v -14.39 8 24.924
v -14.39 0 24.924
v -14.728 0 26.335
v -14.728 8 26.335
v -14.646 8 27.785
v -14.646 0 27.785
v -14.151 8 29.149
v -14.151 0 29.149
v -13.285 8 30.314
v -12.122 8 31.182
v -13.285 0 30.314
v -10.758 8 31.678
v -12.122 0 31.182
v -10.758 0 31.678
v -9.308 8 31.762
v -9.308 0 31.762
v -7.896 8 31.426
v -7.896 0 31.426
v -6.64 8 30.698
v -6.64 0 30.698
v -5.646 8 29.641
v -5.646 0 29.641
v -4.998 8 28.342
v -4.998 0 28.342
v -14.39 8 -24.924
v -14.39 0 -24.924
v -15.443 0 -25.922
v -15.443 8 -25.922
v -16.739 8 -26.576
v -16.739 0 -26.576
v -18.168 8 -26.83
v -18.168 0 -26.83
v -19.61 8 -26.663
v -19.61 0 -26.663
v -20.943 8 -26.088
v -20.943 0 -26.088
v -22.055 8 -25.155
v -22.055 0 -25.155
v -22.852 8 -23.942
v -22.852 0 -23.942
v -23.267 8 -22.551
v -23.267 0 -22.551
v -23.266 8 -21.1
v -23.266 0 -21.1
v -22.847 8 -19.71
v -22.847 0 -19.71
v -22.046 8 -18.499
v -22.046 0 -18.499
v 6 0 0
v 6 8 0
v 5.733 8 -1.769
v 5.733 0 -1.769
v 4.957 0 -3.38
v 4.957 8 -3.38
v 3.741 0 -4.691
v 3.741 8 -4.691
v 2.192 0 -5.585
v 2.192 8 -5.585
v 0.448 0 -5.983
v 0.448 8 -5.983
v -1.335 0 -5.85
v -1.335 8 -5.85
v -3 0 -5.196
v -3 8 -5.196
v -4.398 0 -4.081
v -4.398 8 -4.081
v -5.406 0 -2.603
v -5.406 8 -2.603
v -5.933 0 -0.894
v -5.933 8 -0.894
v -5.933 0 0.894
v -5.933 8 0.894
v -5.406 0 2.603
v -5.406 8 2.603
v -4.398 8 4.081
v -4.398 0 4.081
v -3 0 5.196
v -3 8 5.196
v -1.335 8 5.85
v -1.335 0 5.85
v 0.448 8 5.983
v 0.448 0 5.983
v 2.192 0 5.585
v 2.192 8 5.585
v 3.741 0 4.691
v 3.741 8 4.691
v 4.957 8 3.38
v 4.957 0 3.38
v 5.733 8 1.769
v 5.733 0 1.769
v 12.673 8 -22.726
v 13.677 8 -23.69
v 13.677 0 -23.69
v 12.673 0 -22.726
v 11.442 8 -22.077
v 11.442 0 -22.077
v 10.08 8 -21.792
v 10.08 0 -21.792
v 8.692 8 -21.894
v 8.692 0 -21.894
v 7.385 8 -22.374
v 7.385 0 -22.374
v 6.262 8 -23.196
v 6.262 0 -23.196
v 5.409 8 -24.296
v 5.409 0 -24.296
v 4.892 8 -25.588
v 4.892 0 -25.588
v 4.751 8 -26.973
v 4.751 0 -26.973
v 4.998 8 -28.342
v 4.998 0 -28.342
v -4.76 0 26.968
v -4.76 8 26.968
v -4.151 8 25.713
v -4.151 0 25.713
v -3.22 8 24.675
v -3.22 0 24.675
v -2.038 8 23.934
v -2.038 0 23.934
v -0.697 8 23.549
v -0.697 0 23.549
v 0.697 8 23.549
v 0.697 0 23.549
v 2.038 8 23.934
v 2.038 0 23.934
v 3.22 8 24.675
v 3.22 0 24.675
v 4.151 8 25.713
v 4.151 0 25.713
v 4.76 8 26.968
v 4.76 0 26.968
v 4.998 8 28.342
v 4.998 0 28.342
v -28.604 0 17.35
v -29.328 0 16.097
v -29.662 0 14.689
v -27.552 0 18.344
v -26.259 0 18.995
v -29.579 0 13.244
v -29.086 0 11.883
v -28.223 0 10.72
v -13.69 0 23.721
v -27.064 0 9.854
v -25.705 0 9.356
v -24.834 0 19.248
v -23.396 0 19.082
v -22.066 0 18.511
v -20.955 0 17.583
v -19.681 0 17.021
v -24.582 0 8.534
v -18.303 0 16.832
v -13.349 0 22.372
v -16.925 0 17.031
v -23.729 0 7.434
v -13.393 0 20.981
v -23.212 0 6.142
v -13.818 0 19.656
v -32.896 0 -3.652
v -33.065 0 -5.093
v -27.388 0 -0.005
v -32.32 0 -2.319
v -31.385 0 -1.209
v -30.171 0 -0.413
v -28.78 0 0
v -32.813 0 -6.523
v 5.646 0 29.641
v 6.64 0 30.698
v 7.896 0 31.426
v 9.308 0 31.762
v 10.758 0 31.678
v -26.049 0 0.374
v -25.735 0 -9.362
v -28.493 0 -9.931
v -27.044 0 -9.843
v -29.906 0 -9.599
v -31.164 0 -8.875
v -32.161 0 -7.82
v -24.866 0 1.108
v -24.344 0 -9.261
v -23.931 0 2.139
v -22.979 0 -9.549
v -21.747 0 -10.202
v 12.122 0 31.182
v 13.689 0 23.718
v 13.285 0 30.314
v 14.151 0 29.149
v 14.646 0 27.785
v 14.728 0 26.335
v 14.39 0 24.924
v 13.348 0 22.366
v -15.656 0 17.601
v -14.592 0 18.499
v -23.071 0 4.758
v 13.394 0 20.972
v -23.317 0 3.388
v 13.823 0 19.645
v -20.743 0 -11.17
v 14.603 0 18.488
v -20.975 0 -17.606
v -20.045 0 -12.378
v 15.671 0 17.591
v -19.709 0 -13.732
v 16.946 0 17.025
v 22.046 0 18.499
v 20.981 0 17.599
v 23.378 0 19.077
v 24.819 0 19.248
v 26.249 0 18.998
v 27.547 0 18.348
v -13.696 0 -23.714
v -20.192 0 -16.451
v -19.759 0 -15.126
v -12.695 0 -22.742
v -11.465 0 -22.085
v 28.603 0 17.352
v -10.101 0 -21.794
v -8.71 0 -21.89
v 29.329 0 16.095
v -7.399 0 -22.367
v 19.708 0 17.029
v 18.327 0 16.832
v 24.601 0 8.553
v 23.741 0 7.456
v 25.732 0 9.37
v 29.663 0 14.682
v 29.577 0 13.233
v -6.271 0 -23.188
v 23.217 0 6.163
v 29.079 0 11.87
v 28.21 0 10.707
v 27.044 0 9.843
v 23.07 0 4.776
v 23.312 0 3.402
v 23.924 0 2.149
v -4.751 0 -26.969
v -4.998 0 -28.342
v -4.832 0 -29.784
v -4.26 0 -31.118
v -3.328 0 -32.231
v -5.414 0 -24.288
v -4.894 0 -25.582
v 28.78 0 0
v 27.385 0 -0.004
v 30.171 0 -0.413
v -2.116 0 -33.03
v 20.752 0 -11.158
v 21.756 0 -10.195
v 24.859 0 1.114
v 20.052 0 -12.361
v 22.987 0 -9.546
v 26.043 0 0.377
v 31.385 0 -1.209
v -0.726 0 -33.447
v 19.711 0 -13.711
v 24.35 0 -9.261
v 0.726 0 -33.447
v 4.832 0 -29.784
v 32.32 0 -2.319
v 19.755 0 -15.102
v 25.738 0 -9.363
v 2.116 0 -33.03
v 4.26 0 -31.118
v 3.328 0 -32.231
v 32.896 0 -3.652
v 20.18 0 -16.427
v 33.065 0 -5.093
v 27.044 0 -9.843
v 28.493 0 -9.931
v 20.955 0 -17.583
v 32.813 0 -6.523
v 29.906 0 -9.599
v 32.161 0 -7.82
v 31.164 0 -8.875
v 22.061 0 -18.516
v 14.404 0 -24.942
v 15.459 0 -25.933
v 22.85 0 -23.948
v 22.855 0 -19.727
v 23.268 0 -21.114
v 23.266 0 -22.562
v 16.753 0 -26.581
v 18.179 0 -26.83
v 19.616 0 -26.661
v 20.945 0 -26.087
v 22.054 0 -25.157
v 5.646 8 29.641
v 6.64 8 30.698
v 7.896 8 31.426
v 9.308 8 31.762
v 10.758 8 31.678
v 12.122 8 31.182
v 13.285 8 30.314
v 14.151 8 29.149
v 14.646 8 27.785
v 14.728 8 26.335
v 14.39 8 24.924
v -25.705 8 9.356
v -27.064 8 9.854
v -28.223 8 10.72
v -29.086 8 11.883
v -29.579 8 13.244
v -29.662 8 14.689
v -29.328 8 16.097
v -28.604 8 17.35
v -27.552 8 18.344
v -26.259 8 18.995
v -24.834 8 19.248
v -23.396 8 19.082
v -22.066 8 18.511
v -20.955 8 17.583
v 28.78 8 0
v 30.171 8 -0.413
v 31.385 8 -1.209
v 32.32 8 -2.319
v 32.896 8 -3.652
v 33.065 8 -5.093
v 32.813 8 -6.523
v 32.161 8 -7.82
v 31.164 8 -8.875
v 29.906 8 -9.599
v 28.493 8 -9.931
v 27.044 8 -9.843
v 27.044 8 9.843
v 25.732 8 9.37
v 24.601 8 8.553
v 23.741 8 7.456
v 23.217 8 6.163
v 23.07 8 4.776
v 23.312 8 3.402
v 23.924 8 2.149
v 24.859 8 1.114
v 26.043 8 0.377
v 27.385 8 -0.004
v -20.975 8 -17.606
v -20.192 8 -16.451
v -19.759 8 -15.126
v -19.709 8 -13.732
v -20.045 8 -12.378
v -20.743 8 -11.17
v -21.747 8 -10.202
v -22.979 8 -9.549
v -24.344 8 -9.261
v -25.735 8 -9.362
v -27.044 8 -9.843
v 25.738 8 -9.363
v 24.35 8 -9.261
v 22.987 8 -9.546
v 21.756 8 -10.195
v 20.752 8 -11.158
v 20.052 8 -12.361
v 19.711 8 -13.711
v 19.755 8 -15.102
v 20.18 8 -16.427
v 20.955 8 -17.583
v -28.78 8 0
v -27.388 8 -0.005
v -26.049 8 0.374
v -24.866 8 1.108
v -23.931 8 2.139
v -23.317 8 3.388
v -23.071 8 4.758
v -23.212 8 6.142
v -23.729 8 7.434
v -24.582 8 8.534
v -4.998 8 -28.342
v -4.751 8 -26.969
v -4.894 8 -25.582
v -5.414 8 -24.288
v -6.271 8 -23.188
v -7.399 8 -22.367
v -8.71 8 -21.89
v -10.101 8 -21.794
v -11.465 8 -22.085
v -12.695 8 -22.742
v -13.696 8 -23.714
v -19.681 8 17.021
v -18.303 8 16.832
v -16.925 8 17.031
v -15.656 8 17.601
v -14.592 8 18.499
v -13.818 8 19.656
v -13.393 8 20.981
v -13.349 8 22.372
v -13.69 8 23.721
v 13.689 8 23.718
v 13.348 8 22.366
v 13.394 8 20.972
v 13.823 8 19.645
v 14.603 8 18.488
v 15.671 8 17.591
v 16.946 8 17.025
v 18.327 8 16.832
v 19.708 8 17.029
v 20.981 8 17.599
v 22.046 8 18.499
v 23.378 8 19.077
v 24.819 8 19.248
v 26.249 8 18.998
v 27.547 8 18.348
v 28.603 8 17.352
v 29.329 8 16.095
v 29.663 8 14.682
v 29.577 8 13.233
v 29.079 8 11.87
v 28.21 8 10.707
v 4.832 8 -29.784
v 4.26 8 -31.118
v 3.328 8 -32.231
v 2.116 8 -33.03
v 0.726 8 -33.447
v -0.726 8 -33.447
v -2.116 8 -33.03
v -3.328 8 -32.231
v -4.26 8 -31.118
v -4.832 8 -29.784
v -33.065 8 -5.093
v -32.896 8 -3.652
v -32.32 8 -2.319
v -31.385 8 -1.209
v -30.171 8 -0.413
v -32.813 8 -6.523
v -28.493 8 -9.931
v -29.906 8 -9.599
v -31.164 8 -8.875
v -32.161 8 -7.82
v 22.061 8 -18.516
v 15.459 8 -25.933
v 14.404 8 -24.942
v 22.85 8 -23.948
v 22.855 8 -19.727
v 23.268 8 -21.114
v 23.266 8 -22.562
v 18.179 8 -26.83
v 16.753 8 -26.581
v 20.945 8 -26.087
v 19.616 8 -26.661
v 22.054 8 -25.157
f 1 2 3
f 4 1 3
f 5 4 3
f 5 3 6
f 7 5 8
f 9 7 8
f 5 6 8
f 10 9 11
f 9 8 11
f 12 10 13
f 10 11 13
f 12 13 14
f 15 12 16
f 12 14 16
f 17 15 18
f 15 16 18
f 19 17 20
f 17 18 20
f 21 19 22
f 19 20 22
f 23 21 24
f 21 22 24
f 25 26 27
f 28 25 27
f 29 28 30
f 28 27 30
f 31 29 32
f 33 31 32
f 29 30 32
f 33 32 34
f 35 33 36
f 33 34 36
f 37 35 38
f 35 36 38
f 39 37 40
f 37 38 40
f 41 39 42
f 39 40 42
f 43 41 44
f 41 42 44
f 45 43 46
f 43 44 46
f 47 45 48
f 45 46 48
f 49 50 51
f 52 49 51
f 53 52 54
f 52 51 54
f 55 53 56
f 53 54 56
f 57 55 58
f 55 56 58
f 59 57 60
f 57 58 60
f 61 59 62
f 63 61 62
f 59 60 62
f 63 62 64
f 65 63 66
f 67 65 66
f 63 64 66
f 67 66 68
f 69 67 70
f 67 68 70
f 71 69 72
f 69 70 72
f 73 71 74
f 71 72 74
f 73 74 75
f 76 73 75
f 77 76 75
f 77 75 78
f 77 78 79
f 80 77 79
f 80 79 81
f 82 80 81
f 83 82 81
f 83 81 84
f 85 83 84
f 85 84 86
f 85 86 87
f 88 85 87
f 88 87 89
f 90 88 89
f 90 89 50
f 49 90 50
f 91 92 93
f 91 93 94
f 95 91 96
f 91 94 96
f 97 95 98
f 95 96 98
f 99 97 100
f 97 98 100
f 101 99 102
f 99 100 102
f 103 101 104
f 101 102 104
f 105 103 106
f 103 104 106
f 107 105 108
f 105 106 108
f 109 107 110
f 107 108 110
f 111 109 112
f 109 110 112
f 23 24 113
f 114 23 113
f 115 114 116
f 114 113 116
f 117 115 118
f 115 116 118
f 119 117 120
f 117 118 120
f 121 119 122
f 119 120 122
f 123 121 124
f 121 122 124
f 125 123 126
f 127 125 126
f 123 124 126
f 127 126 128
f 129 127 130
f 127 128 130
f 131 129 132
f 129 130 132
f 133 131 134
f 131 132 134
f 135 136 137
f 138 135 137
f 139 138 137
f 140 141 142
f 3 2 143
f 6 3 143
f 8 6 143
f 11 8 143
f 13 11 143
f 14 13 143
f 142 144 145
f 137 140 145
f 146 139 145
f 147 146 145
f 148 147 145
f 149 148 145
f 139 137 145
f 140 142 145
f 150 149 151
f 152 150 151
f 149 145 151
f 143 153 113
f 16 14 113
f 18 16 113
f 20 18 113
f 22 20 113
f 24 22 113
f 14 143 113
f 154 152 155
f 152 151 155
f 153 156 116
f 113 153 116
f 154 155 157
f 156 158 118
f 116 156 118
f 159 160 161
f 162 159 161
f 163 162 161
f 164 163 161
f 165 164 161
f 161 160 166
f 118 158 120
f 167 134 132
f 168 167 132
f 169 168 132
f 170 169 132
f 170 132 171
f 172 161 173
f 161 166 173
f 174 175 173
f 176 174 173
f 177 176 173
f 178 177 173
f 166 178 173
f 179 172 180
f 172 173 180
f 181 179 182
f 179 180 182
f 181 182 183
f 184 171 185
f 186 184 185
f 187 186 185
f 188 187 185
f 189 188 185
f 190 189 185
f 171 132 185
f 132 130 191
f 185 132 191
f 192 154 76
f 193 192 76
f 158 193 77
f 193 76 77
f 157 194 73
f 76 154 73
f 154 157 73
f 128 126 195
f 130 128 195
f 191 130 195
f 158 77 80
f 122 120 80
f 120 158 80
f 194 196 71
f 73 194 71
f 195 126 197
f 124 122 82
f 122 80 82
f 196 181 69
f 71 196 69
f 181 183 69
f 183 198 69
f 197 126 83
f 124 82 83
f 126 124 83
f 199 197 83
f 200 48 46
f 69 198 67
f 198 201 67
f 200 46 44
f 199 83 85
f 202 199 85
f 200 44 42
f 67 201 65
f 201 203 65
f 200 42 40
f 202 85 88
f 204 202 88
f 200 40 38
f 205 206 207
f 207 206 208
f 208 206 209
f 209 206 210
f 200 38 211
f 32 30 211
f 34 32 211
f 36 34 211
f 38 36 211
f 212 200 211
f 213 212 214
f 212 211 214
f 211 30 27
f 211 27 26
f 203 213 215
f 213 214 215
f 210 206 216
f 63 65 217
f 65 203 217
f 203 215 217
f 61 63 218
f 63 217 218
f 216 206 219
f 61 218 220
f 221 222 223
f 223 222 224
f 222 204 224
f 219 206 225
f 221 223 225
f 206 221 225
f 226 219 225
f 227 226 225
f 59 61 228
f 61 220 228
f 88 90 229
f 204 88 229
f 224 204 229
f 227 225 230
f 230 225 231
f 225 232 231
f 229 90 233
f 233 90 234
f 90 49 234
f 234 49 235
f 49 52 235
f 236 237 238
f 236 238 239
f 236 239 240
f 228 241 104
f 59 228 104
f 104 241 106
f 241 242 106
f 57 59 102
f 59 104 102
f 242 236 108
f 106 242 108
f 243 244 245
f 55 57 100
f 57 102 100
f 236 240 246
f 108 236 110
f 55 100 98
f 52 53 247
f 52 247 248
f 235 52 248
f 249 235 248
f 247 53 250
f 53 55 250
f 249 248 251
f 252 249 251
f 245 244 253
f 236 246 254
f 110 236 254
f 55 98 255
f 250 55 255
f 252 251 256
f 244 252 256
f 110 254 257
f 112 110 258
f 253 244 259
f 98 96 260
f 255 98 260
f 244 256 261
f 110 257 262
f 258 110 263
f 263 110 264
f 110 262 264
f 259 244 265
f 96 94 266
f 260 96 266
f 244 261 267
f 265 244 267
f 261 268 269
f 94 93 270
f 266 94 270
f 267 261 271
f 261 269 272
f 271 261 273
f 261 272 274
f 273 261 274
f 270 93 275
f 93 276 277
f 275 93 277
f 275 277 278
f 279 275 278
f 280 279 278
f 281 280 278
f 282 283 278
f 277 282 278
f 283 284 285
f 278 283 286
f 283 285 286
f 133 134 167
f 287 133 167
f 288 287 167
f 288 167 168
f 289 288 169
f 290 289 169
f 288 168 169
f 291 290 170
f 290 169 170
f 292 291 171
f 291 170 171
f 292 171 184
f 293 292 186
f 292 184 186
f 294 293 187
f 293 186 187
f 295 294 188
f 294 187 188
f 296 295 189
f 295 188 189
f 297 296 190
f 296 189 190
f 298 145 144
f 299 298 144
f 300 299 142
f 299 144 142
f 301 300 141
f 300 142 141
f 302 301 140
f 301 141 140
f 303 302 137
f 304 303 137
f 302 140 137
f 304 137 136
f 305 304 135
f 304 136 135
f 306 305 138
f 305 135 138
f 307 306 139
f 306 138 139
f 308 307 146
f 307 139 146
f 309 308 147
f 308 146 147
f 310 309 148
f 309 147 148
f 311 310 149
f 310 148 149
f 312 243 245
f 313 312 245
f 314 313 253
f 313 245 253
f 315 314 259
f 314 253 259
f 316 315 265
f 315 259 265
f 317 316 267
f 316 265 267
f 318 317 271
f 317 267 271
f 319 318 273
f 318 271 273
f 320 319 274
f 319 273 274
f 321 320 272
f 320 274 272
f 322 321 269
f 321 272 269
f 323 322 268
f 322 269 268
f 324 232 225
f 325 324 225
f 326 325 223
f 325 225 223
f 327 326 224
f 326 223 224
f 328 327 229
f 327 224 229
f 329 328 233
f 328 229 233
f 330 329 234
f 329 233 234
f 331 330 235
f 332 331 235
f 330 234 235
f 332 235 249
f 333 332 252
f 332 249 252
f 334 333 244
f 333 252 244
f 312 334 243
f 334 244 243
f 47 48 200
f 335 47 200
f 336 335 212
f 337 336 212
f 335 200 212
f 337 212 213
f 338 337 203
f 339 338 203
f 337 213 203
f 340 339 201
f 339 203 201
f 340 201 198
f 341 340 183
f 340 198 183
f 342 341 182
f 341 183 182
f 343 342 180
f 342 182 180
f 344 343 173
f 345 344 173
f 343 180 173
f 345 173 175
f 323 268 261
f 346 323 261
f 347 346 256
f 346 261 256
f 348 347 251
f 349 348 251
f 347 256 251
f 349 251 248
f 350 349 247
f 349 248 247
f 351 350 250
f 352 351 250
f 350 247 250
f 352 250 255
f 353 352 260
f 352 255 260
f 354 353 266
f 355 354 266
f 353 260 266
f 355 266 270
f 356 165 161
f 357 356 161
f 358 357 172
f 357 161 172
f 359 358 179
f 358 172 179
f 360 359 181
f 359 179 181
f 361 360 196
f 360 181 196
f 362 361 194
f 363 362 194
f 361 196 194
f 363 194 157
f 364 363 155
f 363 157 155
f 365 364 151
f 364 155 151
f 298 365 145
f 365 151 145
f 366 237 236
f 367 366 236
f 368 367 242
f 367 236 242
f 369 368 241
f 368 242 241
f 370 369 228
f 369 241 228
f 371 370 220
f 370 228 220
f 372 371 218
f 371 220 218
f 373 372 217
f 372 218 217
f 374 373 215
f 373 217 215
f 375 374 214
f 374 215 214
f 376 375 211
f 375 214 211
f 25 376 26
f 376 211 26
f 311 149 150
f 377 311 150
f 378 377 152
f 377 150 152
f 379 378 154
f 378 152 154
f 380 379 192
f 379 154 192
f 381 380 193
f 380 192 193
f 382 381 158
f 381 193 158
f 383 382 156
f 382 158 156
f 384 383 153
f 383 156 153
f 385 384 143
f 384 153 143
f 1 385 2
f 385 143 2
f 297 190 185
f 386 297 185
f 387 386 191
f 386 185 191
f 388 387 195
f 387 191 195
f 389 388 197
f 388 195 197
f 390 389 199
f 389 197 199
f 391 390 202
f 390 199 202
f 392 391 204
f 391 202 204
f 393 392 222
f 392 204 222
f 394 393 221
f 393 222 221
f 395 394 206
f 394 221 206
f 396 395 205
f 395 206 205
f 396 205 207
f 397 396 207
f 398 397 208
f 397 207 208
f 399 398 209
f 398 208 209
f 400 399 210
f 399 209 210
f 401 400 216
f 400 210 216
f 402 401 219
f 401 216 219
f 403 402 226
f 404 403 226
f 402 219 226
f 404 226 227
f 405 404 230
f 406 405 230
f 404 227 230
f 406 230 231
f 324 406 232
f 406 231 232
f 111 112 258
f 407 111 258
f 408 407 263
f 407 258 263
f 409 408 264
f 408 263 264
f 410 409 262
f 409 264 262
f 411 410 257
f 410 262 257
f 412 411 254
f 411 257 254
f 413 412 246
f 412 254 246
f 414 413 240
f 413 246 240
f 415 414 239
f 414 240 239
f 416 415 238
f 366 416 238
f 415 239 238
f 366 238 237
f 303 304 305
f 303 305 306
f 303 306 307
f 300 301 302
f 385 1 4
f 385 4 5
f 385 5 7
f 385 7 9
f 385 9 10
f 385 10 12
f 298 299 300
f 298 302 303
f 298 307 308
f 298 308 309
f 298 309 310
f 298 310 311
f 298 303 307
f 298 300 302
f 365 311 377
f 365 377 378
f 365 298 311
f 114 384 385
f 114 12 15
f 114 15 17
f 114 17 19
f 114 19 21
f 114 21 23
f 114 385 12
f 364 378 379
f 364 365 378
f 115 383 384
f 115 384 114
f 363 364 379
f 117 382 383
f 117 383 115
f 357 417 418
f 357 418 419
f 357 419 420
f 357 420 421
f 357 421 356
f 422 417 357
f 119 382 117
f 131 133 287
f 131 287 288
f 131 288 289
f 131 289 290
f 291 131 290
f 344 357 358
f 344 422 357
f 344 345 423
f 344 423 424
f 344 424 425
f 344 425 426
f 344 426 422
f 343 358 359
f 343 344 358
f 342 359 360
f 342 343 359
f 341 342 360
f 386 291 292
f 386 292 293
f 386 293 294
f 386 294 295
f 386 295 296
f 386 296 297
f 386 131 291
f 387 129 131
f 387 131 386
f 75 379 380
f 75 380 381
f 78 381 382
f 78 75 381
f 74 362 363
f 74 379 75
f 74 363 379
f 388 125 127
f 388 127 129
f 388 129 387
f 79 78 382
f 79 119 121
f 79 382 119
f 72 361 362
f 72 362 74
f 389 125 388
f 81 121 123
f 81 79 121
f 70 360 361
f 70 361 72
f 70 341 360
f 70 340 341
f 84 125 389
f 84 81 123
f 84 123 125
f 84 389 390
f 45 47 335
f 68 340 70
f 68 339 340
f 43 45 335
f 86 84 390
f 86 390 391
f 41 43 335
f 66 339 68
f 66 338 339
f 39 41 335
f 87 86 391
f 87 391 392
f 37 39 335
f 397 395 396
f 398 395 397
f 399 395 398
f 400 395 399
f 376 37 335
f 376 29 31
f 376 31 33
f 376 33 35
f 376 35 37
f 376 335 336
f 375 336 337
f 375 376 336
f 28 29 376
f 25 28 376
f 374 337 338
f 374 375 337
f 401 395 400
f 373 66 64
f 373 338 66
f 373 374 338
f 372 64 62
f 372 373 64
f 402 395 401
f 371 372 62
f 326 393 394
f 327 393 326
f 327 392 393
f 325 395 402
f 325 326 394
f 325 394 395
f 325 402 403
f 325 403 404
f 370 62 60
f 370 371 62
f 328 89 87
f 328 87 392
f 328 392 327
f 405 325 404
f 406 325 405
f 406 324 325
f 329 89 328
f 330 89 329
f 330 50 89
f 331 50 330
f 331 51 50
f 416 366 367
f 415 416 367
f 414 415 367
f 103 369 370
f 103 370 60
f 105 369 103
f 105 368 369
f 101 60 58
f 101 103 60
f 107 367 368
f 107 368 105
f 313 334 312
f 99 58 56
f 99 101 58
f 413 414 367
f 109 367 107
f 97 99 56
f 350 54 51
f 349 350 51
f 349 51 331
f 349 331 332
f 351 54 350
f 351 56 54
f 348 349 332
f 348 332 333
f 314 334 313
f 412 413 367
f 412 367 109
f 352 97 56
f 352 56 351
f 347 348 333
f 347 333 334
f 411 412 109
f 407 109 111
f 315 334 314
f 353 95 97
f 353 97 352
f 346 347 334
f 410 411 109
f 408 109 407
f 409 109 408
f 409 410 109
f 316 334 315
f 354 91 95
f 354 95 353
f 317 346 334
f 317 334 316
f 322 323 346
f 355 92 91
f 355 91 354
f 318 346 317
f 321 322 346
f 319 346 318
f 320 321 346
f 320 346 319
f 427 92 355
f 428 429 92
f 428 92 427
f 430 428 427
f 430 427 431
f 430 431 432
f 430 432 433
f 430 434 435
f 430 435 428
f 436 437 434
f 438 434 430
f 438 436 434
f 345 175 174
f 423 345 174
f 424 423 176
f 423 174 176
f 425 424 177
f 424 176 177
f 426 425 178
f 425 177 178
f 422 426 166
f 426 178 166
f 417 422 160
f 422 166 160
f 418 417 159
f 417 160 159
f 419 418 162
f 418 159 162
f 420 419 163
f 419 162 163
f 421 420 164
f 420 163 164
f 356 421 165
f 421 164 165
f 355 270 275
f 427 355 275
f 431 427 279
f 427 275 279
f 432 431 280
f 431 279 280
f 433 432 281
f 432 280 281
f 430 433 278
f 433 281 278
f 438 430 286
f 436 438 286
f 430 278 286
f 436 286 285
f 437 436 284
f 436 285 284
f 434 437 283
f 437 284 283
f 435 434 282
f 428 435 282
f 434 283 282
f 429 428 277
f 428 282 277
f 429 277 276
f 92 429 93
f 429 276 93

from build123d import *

# Parameters (mm, degrees)
BOSS_EXTRUDE2_DEPTH = 8
SKETCH2_R           = 6
CUT_EXTRUDE1_DEPTH  = 10


with BuildPart() as part:
    # Sketch1 → Boss-Extrude2 (new body)
    with BuildSketch(Plane(origin=(0, 0, 0), x_dir=(1, 0, 0), z_dir=(0, 1, 0))):
        with BuildLine():
            ThreePointArc((28.779527534, 0), (32.991059726, 5.817213952), (27.043909653, 9.843178132))
            ThreePointArc((27.043909653, 9.843178132), (20.752040899, 11.158464676), (20.954773741, 17.583142917))
            ThreePointArc((20.954773741, 17.583142917), (21.533384924, 25.662488844), (13.677257194, 23.689704368))
            ThreePointArc((13.677257194, 23.689704368), (7.385388439, 22.374417824), (4.99751251, 28.342301843))
            ThreePointArc((4.99751251, 28.342301843), (0, 33.5), (-4.99751251, 28.342301843))
            ThreePointArc((-4.99751251, 28.342301843), (-8.037473368, 22.082776588), (-14.389763767, 24.923801953))
            ThreePointArc((-14.389763767, 24.923801953), (-21.533384924, 25.662488844), (-22.046397143, 18.499123711))
            ThreePointArc((-22.046397143, 18.499123711), (-20.351596989, 11.75), (-27.043909653, 9.843178132))
            ThreePointArc((-27.043909653, 9.843178132), (-32.991059726, 5.817213952), (-28.779527534, 0))
            ThreePointArc((-28.779527534, 0), (-23.316959386, -3.387910912), (-25.704835315, -9.355794932))
            ThreePointArc((-25.704835315, -9.355794932), (-29.011851027, -16.75), (-20.954773741, -17.583142917))
            ThreePointArc((-20.954773741, -17.583142917), (-14.592496609, -18.499123711), (-14.389763767, -24.923801953))
            ThreePointArc((-14.389763767, -24.923801953), (-11.457674801, -31.479702796), (-4.99751251, -28.342301843))
            ThreePointArc((-4.99751251, -28.342301843), (0, -23.5), (4.99751251, -28.342301843))
            ThreePointArc((4.99751251, -28.342301843), (11.457674801, -31.479702796), (14.389763767, -24.923801953))
            ThreePointArc((14.389763767, -24.923801953), (15.105508828, -18.002044413), (22.046397143, -18.499123711))
            ThreePointArc((22.046397143, -18.499123711), (29.011851027, -16.75), (27.043909653, -9.843178132))
            ThreePointArc((27.043909653, -9.843178132), (23.142982196, -4.080732175), (28.779527534, 0))
        make_face()
    extrude(amount=BOSS_EXTRUDE2_DEPTH)

    # Sketch2 → Cut-Extrude1 (cut)
    with BuildSketch(Plane(origin=(0, 8, 0), x_dir=(1, 0, 0), z_dir=(0, 1, 0))):
        Circle(SKETCH2_R)
    extrude(amount=-CUT_EXTRUDE1_DEPTH, mode=Mode.SUBTRACT)


solid = part.part
